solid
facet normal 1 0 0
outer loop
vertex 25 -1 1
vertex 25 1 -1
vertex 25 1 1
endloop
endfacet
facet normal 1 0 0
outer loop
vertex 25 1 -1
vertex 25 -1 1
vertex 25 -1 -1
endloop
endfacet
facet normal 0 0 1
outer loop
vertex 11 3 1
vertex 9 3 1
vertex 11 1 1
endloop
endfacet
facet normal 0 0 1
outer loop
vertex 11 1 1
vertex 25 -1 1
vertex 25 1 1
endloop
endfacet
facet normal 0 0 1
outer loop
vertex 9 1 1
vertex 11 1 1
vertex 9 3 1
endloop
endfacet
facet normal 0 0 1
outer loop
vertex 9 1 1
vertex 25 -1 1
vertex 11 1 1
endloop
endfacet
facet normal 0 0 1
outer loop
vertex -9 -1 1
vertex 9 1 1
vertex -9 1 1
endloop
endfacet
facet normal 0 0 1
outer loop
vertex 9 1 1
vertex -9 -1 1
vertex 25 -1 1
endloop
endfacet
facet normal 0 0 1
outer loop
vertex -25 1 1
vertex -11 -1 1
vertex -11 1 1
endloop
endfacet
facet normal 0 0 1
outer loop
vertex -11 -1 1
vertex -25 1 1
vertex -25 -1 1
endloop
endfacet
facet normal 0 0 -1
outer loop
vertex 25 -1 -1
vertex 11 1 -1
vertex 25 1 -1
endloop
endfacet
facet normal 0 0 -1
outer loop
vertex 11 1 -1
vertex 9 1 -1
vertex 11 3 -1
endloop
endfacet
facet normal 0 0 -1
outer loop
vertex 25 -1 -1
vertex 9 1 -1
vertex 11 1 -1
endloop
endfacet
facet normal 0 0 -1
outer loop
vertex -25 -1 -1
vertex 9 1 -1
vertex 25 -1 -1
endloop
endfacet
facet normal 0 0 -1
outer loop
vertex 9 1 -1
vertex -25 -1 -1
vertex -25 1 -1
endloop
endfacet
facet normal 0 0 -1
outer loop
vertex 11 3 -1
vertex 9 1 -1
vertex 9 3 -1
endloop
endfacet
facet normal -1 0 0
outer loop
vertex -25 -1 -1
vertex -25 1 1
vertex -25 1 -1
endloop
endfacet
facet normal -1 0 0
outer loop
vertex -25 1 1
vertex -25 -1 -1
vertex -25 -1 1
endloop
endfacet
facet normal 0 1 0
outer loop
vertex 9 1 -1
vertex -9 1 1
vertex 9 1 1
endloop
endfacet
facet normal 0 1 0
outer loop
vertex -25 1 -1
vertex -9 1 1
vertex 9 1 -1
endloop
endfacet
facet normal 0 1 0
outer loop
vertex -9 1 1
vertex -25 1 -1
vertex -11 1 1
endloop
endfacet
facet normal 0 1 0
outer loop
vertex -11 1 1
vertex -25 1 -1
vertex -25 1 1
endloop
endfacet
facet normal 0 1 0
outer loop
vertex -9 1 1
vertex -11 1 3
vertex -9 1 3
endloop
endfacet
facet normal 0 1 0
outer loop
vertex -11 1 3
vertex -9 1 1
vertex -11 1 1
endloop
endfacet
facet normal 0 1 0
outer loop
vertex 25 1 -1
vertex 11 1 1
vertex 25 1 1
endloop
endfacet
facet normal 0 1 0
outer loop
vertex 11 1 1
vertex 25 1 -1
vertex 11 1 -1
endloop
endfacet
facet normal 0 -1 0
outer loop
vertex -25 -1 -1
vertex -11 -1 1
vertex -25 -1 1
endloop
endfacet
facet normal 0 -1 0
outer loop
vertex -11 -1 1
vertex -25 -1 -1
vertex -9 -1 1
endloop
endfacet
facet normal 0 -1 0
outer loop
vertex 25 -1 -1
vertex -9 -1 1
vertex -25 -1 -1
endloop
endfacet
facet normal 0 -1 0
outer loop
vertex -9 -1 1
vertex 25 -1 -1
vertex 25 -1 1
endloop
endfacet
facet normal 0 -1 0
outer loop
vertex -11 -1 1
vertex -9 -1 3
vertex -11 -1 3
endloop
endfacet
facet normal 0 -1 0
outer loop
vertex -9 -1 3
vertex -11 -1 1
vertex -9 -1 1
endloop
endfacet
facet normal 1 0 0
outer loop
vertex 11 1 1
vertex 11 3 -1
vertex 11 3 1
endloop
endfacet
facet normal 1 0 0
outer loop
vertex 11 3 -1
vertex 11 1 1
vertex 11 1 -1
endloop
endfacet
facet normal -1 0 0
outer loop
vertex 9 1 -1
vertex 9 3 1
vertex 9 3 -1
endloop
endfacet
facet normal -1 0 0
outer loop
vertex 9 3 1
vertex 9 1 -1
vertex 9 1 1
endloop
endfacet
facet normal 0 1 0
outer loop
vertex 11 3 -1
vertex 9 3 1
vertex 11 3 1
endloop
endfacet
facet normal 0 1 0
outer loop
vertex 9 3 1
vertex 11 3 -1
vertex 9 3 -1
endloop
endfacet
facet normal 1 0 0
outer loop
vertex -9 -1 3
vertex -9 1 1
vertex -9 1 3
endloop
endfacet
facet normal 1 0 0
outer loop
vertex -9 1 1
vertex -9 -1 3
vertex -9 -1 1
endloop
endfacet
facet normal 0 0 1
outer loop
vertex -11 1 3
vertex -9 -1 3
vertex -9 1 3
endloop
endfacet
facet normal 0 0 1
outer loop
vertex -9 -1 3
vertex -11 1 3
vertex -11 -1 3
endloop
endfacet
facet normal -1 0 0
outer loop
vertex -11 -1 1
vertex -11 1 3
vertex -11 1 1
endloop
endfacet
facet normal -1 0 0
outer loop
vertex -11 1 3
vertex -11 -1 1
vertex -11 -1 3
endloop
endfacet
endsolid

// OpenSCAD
$fn = 64;

mm = 1;
cm = 10*mm;

module heddle_rod() {
  cube
    ( [ 2*mm
      , 6*mm
      , 5*cm
      ]
    , center = true
    );
}

module heddle_rod_2() {
  cube
    ( [ 5*cm
      , 2*mm
      , 2*mm
      ]
    , center = true
    );
  
  translate([1*cm,2*mm,0])
  cube([ 2*mm, 2*mm, 2*mm ], center = true);

  translate([-1*cm,0,2*mm])
  cube([ 2*mm, 2*mm, 2*mm ], center = true);
}

module selector_rod() {
  cube
    ( [ 14*cm
      , 2*mm
      , 8*mm
      ]
    , center = true
    );
}

heddle_rod_2();

// delta = 10*mm;
// for (i = [0:9])
// for (j = [0:19])
// translate([ j*delta, i*delta, 0 ])
// rotate([0,0,-45])
// translate
//   ( [ 0
//     , 2*mm
//     , 0
//     ]
//   )
// heddle_rod();

// for (i = [0:9])
// translate
//   ( [ 70*mm-1*mm
//     , 2.5*mm + i*delta
//     , 0
//     ]
//   )
// selector_rod();
